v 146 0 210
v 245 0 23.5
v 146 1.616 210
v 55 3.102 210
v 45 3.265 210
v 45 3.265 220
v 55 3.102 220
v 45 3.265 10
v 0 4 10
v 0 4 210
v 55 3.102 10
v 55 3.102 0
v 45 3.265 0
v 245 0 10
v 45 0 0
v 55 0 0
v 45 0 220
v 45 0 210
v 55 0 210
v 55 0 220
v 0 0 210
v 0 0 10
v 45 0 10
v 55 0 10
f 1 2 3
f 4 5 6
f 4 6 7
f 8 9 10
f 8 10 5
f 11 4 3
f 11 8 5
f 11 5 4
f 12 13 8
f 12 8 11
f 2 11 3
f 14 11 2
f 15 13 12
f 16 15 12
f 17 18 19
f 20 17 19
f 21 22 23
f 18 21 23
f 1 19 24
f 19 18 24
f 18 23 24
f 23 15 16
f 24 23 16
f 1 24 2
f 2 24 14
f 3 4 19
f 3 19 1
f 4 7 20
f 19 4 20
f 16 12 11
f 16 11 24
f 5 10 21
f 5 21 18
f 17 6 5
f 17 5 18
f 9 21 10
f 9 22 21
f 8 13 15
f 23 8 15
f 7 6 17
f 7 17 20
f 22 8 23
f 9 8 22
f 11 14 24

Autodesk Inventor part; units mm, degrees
ref_plane "YZ Plane" through (0, 0, 0) normal (1, 0, 0) x (0, 1, 0)
ref_plane "XZ Plane" through (0, 0, 0) normal (0, 1, 0) x (-1, 0, 0)
ref_plane "XY Plane" through (0, 0, 0) normal (0, 0, 1) x (1, 0, 0)
sketch "スケッチ1" plane through (0, 0, 0) normal (0, 1, 0) x (-1, 0, 0)
  point P0 (0, 0)
sketch "スケッチ2" plane through (0, 0, 0) normal (0, 0, 1) x (1, 0, 0)
  line L0 (0, 0) -> (0, 4)
  line L1 (0, 4) -> (245, 0)
  line L2 (0, 0) -> (245, 0)
  dimension "d0" = 4
  dimension "d1" = 245
extrude "押し出し1" add sketch "スケッチ2" along normal blind 220
sketch "スケッチ4" plane through (0, 0, 220) normal (0, 0, 1) x (1, 0, 0)
  line L0 (0, 4) -> (0, 0) projected
  line L1 (55, 0) -> (245, 0)
  line L2 (245, 0) -> (245, 4)
  line L3 (245, 4) -> (55, 4)
  line L4 (55, 4) -> (55, 0)
  line L5 (0, 4) -> (45, 4)
  line L6 (45, 4) -> (45, 0)
  line L7 (45, 0) -> (0, 0)
  line L8 (0, 0) -> (0, 4)
  dimension "d8" = 4
  dimension "d9" = 190
  dimension "d10" = 55
  dimension "d23" = 45
extrude "押し出し2" cut sketch "スケッチ4" against normal blind 10
sketch "スケッチ5" plane through (0, 0, 0) normal (0, 0, -1) x (-1, 0, 0)
  line L0 (-55, 0) -> (-245, 0)
  line L1 (-245, 0) -> (-245, 4)
  line L2 (-245, 4) -> (-55, 4)
  line L3 (-55, 4) -> (-55, 0)
  line L4 (0, 4) -> (0, 0) projected
  line L5 (0, 4) -> (-45, 4)
  line L6 (-45, 4) -> (-45, 0)
  line L7 (-45, 0) -> (0, 0)
  line L8 (0, 0) -> (0, 4)
  dimension "d13" = 4
  dimension "d14" = 55
  dimension "d15" = 190
  dimension "d22" = 45
extrude "押し出し3" cut sketch "スケッチ5" against normal blind 10
sketch "スケッチ6" plane through (0, 0, 0) normal (0, -1, 0) x (1, 0, 0)
  line L0 (0, 0) -> (0, 220) projected
  line L1 (55, 10) -> (245, 10) projected
  line L2 (245, 23.5) -> (146, 210)
  line L3 (245, 210) -> (245, 23.5)
  line L4 (146, 210) -> (245, 23.5)
  line L5 (146, 210) -> (245, 210)
  line L6 (245, 210) -> (55, 210) projected
  dimension "d18" = 146
  dimension "d19" = 13.5
extrude "押し出し4" cut sketch "スケッチ6" against normal blind 10
properties part number "坂"
